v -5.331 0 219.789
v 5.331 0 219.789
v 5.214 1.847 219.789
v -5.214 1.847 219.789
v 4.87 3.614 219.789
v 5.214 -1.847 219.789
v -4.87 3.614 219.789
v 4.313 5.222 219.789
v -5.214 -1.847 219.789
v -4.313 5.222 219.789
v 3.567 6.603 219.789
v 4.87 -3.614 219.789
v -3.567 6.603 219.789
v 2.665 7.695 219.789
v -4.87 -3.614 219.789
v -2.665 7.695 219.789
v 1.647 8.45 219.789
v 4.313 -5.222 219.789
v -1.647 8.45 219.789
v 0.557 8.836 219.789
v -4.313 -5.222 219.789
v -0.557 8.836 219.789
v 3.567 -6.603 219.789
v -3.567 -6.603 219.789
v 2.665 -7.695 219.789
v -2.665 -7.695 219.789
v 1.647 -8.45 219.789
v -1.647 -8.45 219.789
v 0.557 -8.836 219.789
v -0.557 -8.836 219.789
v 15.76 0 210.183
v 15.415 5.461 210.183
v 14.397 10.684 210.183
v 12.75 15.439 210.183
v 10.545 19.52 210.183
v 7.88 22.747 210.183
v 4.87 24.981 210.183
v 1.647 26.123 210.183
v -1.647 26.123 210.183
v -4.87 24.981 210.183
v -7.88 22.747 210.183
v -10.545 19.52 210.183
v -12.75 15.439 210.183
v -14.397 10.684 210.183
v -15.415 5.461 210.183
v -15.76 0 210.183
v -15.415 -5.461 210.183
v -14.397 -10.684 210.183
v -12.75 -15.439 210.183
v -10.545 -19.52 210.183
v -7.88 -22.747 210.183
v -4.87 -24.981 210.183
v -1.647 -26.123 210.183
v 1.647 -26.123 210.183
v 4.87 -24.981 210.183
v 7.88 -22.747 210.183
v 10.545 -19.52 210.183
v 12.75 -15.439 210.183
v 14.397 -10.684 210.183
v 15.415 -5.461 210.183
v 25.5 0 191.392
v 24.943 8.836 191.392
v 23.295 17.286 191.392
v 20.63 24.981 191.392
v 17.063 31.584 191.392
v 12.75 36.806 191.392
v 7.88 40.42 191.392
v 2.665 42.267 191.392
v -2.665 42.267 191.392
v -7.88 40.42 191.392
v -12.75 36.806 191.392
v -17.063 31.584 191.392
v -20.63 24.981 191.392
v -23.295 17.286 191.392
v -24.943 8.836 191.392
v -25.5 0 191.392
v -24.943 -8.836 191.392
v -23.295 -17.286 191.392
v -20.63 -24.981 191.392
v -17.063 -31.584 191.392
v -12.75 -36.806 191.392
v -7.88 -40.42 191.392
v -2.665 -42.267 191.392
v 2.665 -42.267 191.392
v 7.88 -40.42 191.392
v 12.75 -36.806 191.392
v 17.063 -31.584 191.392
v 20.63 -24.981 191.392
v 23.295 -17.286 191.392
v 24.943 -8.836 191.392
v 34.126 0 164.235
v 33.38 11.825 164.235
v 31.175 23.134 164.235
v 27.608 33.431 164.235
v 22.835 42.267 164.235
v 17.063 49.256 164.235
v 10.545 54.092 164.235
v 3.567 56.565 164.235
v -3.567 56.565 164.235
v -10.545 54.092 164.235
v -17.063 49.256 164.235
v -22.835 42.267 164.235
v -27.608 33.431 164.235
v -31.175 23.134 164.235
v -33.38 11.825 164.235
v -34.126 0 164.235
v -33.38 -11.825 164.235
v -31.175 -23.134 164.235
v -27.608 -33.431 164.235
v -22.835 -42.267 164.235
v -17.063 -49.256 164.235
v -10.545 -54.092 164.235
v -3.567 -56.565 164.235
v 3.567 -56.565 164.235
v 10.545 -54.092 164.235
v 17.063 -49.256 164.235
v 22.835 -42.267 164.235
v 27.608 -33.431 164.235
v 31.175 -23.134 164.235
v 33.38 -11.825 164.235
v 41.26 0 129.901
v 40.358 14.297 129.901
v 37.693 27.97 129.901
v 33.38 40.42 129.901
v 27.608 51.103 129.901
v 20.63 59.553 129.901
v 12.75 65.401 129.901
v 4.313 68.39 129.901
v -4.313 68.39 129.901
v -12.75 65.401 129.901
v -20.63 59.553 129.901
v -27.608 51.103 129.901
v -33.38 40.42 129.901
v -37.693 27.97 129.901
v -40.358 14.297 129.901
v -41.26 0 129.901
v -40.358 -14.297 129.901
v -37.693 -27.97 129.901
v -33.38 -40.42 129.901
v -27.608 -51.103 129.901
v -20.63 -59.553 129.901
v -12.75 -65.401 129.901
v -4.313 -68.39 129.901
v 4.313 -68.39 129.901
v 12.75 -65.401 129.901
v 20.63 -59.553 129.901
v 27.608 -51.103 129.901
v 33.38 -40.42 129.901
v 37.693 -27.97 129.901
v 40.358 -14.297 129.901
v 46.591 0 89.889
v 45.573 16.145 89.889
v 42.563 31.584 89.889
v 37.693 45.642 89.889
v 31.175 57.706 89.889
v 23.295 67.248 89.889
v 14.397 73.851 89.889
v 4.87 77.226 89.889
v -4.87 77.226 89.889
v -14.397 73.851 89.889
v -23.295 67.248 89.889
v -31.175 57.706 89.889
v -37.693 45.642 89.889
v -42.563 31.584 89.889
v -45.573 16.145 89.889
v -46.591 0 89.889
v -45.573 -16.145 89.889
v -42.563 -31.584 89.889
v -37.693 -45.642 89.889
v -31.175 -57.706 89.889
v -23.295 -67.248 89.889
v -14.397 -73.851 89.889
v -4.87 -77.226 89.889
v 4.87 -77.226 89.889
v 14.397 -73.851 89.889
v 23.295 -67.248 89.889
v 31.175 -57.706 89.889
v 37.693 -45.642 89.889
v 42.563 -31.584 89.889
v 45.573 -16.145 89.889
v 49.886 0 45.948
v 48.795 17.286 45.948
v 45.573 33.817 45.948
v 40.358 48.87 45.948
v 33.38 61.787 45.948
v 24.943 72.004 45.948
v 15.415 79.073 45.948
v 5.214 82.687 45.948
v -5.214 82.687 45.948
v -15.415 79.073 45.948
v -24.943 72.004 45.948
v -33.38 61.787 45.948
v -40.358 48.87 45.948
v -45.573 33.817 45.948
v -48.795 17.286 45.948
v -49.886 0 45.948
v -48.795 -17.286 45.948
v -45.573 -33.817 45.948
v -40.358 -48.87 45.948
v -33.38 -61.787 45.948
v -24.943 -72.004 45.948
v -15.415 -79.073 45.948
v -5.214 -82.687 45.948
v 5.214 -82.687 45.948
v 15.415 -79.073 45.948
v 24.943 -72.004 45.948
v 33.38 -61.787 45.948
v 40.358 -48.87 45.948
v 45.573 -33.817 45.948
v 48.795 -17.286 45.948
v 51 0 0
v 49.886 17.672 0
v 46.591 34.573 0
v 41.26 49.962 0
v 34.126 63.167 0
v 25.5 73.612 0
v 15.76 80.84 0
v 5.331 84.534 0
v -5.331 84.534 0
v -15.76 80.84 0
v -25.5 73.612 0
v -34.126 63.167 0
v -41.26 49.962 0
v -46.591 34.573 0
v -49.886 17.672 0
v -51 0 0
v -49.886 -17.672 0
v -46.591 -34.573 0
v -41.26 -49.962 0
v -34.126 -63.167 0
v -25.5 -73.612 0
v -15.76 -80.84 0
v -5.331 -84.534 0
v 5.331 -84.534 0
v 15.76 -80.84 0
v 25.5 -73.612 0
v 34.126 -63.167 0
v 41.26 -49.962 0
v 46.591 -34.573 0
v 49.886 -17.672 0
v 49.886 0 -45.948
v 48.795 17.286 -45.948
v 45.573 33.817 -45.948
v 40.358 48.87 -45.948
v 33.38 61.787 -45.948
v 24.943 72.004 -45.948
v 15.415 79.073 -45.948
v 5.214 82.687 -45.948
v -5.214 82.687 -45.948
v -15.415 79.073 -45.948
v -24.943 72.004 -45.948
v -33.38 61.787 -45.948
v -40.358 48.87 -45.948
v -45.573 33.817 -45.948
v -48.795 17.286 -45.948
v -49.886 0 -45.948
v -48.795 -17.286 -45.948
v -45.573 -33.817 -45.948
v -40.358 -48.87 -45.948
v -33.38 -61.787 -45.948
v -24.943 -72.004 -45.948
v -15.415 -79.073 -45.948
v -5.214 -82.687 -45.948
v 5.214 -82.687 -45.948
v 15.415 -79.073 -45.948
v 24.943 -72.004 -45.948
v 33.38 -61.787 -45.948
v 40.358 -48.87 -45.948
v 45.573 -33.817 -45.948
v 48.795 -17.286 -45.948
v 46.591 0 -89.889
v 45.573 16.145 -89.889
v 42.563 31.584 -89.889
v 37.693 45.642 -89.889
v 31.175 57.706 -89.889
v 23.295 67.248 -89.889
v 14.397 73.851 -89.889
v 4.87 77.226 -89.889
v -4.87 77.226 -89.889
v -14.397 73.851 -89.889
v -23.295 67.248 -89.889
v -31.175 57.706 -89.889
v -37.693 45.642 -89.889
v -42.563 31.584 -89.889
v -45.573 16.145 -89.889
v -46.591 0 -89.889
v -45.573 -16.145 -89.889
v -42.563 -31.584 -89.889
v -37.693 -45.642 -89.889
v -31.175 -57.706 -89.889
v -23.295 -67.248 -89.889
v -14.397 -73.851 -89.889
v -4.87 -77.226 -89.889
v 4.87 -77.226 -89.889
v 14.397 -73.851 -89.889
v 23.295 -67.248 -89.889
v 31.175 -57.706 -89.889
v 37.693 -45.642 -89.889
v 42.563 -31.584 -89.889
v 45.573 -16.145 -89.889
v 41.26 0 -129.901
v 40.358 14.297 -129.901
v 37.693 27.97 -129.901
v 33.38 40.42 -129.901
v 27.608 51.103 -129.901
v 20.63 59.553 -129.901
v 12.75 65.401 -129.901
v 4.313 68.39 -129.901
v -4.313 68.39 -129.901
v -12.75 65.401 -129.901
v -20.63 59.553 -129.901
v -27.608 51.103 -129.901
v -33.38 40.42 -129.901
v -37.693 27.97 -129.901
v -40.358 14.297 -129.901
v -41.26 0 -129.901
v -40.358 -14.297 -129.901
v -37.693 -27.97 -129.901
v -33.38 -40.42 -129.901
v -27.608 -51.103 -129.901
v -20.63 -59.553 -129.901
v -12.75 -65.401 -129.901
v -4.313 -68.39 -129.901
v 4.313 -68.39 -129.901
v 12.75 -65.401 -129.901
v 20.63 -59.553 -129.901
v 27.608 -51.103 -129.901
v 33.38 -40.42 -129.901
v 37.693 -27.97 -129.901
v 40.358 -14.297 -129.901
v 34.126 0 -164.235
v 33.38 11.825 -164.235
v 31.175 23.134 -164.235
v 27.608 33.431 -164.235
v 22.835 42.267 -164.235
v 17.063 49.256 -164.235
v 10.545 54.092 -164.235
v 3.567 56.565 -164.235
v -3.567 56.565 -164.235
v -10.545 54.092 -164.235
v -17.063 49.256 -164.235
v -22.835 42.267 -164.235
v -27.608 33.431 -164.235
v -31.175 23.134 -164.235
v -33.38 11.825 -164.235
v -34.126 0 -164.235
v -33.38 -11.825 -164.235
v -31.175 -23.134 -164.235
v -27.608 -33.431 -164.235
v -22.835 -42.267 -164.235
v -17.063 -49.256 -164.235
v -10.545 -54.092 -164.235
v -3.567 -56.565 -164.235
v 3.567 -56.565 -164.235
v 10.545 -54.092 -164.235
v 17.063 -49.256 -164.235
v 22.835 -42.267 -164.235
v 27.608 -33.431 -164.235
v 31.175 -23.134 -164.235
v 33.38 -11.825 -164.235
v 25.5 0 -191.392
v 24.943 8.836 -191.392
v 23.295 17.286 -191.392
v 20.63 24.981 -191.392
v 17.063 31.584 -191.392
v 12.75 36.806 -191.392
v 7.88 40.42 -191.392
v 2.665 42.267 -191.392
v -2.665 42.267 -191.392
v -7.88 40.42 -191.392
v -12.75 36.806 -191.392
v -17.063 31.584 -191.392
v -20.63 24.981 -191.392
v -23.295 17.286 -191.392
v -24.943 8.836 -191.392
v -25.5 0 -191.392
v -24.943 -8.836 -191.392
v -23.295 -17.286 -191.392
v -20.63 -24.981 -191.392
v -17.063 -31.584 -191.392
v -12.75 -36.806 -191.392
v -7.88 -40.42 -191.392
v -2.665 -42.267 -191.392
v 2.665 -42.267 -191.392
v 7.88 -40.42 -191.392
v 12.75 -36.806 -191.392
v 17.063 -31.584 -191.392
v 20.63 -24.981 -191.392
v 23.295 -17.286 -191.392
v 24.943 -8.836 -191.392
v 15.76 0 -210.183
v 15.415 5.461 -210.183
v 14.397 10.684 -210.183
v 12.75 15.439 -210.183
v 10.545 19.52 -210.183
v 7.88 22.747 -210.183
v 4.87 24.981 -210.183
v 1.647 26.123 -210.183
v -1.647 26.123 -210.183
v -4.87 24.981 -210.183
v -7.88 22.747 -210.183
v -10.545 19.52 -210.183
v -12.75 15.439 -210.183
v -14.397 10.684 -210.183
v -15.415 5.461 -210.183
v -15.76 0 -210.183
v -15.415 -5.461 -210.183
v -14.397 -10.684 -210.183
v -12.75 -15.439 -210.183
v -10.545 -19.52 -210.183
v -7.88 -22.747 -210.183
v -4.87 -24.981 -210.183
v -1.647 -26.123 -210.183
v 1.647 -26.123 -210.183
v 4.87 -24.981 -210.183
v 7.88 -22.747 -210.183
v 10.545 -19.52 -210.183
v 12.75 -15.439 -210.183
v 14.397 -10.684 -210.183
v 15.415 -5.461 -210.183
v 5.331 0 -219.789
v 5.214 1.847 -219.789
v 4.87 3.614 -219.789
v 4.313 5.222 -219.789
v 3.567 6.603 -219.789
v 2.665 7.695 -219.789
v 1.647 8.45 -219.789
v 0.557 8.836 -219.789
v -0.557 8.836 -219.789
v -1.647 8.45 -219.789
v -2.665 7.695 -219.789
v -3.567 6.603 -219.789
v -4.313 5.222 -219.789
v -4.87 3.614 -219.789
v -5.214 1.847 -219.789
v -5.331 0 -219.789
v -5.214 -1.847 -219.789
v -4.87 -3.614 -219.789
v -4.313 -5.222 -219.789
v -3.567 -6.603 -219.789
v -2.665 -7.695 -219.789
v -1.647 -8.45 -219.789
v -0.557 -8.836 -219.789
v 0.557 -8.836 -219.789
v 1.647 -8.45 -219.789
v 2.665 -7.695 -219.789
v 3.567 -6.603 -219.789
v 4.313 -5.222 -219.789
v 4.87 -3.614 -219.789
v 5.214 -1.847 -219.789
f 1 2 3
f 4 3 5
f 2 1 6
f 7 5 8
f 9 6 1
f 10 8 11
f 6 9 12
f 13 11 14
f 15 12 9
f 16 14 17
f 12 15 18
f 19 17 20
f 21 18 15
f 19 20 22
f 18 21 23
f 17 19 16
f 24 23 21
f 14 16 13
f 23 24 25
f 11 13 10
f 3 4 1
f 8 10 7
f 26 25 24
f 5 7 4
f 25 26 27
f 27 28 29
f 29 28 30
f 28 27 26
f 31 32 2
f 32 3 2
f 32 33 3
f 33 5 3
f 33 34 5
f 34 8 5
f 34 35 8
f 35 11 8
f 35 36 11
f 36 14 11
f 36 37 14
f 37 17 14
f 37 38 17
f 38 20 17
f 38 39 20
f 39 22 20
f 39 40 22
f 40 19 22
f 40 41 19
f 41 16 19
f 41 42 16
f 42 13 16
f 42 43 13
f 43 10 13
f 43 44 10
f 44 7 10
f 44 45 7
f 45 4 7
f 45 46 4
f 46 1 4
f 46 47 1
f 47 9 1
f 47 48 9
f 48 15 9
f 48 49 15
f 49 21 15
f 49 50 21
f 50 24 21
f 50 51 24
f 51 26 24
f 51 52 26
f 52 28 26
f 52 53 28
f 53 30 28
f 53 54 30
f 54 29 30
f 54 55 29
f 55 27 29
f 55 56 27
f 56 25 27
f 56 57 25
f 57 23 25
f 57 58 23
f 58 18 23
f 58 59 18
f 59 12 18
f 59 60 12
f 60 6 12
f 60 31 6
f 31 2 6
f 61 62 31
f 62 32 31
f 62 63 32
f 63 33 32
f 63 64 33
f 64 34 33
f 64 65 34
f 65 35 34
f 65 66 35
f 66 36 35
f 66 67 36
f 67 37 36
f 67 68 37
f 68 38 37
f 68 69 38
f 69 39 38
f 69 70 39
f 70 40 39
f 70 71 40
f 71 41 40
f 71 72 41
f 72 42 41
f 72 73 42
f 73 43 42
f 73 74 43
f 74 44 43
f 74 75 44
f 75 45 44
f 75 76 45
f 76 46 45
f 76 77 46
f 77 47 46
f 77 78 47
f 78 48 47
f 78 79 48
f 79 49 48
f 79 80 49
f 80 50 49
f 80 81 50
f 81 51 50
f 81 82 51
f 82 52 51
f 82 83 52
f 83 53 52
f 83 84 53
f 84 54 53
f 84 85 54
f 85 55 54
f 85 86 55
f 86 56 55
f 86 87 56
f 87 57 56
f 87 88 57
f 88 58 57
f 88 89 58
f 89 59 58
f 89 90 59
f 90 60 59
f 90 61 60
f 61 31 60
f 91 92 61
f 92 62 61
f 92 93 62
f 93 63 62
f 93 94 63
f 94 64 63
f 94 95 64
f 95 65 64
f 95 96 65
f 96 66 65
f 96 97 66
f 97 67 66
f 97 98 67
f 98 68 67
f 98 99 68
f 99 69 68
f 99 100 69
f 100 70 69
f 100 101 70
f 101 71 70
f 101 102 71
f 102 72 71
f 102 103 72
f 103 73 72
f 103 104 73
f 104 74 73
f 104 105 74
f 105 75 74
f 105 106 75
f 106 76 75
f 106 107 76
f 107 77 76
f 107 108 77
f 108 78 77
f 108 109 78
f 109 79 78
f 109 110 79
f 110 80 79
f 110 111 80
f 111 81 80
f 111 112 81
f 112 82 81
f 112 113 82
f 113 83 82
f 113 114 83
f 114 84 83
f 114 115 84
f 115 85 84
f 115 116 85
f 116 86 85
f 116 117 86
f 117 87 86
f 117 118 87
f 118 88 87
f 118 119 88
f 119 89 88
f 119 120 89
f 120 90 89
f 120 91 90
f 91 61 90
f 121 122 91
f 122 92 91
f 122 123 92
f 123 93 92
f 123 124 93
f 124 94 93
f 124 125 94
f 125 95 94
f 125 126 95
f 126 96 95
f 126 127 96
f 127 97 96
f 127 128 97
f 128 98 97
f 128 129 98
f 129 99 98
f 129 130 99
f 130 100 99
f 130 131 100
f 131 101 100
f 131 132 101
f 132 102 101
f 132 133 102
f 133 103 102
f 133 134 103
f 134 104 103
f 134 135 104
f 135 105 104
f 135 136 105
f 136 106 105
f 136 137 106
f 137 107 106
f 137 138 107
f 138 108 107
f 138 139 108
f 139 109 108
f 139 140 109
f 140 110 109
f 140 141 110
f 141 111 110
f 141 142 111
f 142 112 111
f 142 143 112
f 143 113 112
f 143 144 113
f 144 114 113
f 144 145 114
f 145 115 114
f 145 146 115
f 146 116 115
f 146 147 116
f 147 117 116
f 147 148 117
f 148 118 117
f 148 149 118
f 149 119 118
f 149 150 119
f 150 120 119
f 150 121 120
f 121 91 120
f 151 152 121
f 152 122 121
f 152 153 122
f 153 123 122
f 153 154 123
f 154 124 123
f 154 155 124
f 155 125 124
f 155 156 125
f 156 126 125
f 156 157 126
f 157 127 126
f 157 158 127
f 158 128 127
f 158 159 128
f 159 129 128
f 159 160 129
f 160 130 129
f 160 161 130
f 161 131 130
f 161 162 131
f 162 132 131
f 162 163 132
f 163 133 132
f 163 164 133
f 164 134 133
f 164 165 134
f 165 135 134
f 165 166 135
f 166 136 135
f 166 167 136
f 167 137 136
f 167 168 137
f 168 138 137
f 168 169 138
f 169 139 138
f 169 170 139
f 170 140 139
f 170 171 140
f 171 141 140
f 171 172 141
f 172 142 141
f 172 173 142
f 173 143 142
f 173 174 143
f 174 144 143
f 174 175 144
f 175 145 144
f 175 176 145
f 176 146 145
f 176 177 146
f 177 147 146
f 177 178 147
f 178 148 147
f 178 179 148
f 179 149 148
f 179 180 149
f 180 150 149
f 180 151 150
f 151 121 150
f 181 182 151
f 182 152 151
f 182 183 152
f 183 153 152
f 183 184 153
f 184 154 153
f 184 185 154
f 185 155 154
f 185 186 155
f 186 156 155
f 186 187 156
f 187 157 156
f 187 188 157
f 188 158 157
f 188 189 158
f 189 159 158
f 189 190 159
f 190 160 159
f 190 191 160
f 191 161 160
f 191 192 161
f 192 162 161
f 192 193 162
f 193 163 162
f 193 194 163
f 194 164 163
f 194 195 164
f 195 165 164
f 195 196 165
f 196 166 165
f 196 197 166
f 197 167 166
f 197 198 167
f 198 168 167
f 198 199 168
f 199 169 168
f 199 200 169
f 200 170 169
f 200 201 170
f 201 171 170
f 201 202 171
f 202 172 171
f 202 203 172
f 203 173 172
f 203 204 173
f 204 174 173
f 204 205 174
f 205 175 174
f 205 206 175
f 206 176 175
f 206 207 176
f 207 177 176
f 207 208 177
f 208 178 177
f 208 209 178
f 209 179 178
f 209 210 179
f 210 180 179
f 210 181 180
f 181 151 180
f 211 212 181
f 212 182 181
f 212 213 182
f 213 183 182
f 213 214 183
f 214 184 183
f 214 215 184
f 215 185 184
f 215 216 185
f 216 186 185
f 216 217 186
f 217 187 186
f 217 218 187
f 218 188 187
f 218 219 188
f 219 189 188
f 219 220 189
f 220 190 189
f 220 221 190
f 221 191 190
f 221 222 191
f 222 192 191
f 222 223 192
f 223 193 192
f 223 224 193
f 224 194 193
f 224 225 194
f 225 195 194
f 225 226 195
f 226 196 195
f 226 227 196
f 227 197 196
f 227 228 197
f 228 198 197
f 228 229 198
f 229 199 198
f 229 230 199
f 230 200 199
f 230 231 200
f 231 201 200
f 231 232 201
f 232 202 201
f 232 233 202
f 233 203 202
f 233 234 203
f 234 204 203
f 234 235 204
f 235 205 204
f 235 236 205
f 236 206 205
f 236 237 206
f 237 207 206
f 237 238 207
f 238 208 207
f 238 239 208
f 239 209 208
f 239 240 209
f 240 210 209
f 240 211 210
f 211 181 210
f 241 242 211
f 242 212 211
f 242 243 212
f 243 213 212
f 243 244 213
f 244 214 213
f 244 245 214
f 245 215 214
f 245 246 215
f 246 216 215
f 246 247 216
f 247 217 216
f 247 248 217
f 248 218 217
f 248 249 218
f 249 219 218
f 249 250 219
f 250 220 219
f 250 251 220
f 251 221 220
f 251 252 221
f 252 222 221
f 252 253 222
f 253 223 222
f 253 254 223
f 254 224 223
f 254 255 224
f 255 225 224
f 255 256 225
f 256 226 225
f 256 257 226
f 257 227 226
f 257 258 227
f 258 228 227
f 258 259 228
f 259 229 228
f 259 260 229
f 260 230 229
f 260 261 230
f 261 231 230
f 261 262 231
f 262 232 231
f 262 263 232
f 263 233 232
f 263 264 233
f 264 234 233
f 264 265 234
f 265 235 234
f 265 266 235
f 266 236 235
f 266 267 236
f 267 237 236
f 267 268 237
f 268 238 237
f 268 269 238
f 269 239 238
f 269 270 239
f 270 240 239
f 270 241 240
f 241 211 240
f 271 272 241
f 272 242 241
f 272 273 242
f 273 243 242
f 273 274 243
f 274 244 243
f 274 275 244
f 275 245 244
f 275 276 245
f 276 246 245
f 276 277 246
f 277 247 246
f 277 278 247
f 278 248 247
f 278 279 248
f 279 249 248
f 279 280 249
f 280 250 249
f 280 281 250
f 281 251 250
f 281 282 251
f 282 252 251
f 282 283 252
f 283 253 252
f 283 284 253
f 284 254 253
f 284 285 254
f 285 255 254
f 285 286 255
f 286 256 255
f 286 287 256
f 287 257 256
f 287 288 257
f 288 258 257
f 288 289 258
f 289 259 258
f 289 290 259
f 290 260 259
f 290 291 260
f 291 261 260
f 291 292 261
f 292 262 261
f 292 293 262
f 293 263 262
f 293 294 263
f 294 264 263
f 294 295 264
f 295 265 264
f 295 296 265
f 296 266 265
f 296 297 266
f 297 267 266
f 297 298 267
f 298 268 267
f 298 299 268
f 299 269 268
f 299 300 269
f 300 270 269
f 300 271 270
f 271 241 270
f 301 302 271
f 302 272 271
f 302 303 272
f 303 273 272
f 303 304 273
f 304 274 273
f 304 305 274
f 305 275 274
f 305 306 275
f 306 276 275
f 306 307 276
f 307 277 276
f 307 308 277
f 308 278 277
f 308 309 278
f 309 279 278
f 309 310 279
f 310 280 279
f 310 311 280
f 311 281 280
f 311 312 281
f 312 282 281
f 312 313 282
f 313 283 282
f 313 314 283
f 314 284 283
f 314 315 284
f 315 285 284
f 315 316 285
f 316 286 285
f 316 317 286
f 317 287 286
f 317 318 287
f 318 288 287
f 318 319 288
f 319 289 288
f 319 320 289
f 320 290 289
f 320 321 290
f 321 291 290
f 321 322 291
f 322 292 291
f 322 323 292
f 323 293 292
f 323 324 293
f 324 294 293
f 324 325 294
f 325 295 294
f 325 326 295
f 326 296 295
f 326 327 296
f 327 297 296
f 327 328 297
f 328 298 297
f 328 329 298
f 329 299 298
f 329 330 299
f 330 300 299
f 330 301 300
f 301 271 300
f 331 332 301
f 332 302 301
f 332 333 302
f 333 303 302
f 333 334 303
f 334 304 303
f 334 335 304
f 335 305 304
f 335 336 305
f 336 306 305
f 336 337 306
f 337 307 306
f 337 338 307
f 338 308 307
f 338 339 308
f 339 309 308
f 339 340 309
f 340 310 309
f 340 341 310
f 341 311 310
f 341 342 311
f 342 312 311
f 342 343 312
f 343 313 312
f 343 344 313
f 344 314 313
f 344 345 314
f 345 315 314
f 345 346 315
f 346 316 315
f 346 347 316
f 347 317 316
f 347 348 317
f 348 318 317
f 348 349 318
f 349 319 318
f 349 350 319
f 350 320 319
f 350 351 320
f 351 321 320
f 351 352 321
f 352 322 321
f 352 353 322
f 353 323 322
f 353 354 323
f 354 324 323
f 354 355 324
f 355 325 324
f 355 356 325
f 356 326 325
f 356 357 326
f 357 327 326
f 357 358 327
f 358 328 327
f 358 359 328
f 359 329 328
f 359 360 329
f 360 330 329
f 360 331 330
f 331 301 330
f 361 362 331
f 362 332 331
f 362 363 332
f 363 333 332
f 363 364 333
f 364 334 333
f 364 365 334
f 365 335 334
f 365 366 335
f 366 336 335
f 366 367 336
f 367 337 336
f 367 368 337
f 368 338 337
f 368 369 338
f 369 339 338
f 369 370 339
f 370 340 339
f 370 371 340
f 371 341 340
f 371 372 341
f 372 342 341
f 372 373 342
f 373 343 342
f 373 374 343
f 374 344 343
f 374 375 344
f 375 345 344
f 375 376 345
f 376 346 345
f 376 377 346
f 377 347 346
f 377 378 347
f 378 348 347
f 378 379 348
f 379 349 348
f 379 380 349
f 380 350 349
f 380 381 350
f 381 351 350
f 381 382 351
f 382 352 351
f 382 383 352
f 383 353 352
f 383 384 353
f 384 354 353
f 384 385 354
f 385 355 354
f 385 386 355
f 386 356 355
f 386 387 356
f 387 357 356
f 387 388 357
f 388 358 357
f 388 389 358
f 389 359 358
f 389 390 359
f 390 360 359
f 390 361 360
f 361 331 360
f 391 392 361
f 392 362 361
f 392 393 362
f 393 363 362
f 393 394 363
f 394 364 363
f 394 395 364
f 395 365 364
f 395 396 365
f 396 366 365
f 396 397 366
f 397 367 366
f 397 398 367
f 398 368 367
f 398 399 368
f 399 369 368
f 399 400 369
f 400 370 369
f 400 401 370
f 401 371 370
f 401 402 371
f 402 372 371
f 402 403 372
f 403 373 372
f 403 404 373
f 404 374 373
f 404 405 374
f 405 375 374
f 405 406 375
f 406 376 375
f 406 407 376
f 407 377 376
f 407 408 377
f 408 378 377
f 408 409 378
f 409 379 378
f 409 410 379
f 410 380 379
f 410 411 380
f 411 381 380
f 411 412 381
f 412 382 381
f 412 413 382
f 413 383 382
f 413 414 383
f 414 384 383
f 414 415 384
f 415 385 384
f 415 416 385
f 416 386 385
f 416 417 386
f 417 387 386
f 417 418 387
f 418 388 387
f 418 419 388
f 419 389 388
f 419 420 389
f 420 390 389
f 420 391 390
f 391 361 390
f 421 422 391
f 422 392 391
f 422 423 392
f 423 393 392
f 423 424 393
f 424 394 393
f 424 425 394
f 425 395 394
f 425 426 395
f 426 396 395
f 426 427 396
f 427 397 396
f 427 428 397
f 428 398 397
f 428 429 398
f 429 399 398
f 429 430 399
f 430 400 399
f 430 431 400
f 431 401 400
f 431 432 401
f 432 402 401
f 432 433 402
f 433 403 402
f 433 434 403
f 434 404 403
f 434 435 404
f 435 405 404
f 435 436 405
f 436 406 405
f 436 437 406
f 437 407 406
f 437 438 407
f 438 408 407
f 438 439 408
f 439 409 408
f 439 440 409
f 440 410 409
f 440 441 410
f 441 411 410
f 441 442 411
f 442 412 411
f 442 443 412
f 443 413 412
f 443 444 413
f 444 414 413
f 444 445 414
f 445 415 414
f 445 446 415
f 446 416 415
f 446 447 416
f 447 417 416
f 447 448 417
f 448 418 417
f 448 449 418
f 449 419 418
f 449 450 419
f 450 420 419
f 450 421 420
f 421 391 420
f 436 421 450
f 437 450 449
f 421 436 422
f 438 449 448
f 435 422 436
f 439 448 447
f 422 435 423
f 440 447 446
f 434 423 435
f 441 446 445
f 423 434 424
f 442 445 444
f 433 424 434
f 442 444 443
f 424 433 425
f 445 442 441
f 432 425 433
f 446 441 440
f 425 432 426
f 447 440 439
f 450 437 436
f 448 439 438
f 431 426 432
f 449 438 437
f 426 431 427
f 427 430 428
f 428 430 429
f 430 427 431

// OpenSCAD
// Generated by SolidPython 1.0.1 on 2020-07-29 00:46:45


scale(v = [3, 5, 13]) {
	sphere(r = 17);
}
/***********************************************
*********      SolidPython code:      **********
************************************************
 
# import packages: SolidPython
from solid import *
from solid.utils import *
from itertools import chain, combinations, permutations


class Resize:

    def __init__(self, scad_file):
        self.scad_file = scad_file
        #self.scad_file = import_scad(scad_file)
        # cone/cylinder param:
        self.r1 = 0
        self.r2 = 0
        self.h = 0
        # rectangular prism param:
        self.w = 0
        self.l = 0
        # ellipse param:
        self.r = 0

    # import OpenScad code (file name corresponds to shape)


    # classify shape + parameters
    def assign(self, param1, param2, param3):
        if self.scad_file == 'cone.scad':
            self.r1 = param1
            self.r2 = param2
            self.h = param3
        elif self.scad_file == 'cylinder.scad':
            self.r1 = param1
            self.r2 = param2
            self.h = param3
        elif self.scad_file == 'rectangularPrism.scad':
            self.h = param1
            self.l = param2
            self.w = param3
        else:
            self.r = param1
            self.h = param2

    # resize parameters
    def iterate(self):
        x = range(3, 20, 2)
        i = 1
        if self.scad_file == 'cone.scad':
            tempList = list(permutations(x, 2))
            for temp in tempList:
                param1 = temp[0]
                param2 = temp[1]
                filepath = 'produced_scad_files/' + 'cone' + str(param1) + '_' + str(param2) + '_' + '.scad'
                scad_render_to_file(cylinder(h=param1, r1=param2, r2=0), filepath)

        elif self.scad_file == 'cylinder.scad':
            tempList = list(permutations(x, 3))
            for temp in tempList:
                param1 = temp[0]
                param2 = temp[1]
                filepath = 'produced_scad_files/' + 'cylinder' + str(param1) + '_' + str(param2) + '_' + '.scad'
                scad_render_to_file(cylinder(h=param1, r1=param2, r2=param2), filepath)

        elif self.scad_file == 'rectangularPrism.scad':
            tempList = list(permutations(x, 3))
            for temp in tempList:
                param1 = temp[0]
                param2 = temp[1]
                param3 = temp[2]
                filepath = 'produced_scad_files/' + 'rectangularPrism' + str(param1) + '_' + str(param2) + '_' + str(
                    param3) + '.scad'
                scad_render_to_file(cube(size=(param1, param2, param3)), filepath)

        elif self.scad_file == 'ellipse.scad':
            tempList = list(permutations(x, 4))
            for temp in tempList:
                param1 = temp[0]
                param2 = temp[1]
                param3 = temp[2]
                param4 = temp[3]
                filepath = 'produced_scad_files/' + 'ellipse' + str(param1) + '_' + str(param2) + '_' + str(param3) + '_' + str(param4) + '.scad'
                scad_render_to_file(scale([param1, param2, param3])(sphere(r=param4)), filepath)

    def render_to_scadfile(self):
        scad_render_to_file(scad, 'example.scad') 
 
************************************************/
